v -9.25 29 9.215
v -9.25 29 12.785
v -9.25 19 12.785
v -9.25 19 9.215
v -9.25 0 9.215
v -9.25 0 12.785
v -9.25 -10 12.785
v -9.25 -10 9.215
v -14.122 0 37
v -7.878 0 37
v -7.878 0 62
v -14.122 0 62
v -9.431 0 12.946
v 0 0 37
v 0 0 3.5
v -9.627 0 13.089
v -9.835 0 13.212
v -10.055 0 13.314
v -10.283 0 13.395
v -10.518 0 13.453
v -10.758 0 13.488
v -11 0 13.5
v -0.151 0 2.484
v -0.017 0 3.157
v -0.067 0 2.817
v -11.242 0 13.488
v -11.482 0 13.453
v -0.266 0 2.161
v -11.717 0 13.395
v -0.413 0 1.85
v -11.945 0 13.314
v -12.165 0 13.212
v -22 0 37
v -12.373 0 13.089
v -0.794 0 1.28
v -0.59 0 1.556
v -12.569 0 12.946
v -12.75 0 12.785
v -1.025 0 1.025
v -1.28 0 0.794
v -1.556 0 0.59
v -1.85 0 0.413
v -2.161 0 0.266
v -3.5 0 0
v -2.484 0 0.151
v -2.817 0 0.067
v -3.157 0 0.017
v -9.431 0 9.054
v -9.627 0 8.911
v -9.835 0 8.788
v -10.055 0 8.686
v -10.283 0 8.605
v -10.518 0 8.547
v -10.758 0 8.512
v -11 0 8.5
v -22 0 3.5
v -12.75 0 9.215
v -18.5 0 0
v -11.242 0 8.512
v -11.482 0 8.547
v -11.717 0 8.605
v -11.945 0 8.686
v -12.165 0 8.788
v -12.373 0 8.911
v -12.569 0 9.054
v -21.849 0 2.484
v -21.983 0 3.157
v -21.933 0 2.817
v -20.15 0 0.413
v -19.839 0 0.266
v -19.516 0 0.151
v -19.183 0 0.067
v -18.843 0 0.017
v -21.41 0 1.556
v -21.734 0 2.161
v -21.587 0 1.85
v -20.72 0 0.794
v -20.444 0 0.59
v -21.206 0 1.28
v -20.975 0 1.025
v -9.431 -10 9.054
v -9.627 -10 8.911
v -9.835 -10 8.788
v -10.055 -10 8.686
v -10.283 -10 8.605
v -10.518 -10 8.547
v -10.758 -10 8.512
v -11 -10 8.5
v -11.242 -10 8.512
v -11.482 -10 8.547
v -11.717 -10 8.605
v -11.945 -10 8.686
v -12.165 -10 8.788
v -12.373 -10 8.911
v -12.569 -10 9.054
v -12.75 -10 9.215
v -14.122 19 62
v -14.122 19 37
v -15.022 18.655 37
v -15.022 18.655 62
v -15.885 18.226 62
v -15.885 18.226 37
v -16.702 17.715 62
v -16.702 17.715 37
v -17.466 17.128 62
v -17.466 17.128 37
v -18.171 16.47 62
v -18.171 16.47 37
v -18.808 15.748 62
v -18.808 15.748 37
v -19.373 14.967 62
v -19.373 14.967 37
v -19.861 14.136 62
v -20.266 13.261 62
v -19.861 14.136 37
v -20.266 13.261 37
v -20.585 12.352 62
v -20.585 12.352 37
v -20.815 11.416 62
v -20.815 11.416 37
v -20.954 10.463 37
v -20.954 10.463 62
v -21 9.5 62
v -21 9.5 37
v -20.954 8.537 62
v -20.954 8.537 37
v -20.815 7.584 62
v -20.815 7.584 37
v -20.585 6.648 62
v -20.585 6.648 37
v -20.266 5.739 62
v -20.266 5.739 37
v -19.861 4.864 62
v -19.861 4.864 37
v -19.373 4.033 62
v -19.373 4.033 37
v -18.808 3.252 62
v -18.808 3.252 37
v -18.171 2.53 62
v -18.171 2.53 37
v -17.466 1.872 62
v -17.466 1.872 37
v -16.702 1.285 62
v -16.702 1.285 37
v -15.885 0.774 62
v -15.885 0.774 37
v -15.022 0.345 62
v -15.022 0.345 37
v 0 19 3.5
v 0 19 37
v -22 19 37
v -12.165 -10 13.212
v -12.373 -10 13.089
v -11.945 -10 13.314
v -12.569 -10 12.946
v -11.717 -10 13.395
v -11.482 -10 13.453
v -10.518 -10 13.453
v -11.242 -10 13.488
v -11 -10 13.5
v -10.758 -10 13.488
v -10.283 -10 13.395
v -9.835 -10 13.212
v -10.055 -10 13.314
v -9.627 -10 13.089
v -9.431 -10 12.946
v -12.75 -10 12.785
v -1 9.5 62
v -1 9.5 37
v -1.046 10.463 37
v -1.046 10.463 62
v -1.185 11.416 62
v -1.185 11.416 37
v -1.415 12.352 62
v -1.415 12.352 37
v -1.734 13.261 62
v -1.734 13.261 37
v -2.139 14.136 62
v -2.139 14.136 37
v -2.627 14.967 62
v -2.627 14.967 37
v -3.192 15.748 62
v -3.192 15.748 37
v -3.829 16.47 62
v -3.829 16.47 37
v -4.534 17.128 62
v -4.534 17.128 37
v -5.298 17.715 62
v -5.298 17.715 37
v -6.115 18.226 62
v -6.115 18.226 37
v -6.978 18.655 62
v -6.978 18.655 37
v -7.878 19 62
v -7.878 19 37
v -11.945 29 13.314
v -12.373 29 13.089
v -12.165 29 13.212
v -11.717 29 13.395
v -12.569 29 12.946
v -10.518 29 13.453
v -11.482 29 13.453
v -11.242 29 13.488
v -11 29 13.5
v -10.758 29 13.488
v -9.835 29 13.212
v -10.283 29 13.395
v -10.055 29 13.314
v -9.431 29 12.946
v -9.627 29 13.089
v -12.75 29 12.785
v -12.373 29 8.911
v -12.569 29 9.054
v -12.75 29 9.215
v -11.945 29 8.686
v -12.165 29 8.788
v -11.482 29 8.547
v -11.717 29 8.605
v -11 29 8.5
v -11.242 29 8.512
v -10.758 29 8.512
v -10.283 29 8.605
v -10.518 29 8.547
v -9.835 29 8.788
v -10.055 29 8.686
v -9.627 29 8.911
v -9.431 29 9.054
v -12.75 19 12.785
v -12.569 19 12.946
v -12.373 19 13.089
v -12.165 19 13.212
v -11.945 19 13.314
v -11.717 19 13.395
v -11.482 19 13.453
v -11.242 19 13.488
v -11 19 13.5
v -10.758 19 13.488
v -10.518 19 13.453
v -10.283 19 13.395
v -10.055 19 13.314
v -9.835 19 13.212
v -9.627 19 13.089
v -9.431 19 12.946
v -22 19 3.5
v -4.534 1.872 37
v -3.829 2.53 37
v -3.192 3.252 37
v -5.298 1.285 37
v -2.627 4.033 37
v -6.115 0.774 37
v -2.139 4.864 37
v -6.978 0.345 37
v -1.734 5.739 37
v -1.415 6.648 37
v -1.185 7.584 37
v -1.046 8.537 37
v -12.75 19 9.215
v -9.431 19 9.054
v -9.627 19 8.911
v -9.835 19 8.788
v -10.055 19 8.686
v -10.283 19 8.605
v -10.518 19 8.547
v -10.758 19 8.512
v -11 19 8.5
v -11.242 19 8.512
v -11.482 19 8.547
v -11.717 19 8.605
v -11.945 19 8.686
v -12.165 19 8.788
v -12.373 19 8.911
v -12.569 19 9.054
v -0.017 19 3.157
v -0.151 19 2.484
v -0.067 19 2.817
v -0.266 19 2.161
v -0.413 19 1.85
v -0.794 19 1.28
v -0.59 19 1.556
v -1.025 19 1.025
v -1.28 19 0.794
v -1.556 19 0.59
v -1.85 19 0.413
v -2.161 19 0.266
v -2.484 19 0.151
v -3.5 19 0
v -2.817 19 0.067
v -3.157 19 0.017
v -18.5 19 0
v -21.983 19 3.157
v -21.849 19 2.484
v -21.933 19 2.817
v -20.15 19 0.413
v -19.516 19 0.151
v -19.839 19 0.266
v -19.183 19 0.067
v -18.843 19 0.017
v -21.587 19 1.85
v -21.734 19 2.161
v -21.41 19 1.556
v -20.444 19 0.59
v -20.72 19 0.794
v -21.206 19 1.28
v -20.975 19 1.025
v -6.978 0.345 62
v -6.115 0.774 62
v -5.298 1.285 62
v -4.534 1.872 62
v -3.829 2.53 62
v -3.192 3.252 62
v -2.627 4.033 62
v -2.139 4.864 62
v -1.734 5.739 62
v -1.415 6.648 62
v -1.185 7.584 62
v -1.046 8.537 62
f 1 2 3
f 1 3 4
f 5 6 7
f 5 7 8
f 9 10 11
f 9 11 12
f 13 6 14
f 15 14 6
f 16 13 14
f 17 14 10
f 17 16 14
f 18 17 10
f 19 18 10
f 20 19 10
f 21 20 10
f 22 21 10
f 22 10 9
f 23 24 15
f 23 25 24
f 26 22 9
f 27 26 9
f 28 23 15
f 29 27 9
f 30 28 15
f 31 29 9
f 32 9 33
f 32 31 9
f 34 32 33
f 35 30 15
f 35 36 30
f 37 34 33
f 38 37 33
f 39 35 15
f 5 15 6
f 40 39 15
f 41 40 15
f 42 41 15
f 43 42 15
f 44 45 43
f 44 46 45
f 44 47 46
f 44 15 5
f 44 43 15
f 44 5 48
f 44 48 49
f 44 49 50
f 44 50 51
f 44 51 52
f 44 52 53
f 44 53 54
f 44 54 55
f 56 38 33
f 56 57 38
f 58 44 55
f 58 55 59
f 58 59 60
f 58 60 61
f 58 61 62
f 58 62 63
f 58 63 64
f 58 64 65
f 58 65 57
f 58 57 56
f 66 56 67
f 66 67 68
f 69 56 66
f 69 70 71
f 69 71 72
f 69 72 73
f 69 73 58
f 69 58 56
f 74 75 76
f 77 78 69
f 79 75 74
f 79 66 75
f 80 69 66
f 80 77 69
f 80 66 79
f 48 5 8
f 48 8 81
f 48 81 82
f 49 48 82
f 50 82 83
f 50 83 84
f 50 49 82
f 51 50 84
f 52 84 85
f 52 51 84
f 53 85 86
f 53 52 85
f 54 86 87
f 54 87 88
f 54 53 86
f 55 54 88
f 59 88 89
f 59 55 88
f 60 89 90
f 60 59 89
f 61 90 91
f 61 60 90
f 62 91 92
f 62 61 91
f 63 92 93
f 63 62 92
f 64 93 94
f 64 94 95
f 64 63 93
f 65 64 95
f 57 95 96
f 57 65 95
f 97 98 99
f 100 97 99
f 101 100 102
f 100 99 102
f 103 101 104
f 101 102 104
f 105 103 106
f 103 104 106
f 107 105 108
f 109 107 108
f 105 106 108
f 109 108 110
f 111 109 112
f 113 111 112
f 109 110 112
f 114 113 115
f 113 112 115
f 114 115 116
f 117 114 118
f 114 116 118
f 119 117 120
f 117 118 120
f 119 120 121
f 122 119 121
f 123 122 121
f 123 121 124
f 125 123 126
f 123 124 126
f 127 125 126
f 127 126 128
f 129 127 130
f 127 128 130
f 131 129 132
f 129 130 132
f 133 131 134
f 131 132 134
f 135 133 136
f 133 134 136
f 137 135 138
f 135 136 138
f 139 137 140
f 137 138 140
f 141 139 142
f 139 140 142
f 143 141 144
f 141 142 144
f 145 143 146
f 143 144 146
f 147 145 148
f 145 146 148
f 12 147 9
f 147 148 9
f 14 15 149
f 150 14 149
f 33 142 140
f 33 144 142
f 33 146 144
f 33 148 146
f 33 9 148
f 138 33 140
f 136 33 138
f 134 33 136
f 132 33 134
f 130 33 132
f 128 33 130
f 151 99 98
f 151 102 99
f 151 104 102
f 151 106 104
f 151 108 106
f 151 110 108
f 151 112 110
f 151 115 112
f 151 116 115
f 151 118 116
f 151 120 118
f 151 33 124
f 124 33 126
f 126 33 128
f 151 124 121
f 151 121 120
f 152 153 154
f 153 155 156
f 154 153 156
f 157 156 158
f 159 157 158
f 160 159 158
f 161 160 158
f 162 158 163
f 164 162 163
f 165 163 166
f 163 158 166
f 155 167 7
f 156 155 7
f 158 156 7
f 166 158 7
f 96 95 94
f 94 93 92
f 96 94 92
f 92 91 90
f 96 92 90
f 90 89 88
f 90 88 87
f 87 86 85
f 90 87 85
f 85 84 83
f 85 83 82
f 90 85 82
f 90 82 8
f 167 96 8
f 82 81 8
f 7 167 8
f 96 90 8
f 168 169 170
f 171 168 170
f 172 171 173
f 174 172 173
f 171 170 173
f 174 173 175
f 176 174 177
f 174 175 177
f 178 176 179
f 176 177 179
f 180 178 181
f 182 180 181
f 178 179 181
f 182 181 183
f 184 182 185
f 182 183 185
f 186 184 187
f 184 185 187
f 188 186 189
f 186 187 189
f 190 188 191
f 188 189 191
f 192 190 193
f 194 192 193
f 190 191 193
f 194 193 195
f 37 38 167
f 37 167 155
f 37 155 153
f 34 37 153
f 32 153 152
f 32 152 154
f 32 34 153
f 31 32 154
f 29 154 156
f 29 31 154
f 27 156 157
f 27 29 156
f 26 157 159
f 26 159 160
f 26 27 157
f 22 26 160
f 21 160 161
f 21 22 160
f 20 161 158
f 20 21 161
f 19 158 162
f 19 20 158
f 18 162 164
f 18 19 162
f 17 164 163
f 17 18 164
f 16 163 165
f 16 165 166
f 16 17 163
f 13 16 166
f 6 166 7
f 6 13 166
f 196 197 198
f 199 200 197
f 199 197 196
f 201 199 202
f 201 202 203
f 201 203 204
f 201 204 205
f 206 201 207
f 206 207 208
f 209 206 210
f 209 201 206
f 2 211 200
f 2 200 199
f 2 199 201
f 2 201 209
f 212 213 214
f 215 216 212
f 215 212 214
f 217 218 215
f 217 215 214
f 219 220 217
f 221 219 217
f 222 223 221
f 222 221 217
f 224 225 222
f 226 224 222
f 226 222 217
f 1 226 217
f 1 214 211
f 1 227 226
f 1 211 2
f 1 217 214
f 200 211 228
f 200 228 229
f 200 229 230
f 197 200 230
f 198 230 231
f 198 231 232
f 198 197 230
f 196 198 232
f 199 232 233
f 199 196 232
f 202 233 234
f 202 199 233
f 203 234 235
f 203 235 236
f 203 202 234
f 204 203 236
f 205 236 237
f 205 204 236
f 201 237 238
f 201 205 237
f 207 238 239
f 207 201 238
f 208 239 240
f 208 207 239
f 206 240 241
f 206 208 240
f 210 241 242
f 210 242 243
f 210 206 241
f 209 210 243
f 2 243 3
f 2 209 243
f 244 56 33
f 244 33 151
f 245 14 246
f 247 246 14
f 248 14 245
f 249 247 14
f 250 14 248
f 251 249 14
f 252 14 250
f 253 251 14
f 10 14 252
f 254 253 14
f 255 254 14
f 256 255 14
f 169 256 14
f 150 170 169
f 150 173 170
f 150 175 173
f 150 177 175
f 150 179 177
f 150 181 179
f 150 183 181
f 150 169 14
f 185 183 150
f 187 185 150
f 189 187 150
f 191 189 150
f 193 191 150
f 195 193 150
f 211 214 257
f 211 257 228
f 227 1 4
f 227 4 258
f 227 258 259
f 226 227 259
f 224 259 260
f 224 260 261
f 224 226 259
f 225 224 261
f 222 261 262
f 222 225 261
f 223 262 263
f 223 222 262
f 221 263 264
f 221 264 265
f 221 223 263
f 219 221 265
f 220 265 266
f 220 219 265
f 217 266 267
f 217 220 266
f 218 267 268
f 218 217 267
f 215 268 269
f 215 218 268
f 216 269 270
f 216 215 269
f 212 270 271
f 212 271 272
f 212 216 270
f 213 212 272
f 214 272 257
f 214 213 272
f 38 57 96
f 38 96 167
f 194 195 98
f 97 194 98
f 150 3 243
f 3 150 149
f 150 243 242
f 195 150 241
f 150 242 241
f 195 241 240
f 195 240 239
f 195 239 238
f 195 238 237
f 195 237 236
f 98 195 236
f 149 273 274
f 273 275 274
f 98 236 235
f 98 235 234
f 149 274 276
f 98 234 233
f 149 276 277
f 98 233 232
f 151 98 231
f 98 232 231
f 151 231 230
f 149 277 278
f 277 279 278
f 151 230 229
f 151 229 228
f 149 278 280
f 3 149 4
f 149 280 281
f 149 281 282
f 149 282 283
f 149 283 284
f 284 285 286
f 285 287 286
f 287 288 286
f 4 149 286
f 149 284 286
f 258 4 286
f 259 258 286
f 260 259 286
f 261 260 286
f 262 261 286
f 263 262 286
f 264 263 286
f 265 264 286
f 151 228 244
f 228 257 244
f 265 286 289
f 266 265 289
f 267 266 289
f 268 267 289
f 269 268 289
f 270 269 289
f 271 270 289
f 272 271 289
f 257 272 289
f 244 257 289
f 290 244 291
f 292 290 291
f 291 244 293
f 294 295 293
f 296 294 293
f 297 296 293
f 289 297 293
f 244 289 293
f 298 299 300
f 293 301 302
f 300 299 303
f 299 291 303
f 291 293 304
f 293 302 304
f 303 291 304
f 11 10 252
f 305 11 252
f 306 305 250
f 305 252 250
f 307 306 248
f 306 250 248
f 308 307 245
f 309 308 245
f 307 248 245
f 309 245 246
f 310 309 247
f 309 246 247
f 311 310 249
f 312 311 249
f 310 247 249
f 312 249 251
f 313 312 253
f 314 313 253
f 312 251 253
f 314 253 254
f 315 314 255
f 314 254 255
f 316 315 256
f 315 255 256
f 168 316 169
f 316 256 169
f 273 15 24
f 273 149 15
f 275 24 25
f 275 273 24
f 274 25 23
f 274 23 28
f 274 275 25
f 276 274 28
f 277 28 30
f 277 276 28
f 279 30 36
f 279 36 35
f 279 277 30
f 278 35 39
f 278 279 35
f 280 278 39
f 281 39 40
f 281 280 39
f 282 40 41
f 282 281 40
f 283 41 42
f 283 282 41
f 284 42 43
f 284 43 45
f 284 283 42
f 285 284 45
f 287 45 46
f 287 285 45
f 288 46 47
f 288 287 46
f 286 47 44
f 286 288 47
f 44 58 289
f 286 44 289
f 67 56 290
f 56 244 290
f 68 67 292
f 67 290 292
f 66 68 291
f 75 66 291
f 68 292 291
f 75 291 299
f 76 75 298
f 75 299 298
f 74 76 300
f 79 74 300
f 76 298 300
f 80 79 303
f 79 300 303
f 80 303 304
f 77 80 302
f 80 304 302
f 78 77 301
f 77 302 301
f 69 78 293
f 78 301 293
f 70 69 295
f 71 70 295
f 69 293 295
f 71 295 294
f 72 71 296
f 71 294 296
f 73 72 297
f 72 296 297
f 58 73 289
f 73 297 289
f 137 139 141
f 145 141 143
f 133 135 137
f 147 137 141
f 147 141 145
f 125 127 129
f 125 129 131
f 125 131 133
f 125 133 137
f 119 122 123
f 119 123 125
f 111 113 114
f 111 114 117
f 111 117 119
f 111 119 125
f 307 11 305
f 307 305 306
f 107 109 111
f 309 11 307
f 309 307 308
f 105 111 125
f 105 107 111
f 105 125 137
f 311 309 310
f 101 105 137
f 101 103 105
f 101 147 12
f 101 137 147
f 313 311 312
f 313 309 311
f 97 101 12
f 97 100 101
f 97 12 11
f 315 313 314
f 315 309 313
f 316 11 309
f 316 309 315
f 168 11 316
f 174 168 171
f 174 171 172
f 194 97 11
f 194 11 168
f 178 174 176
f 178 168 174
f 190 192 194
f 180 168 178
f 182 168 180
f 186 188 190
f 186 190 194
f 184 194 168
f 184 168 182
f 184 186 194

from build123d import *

# Parameters (mm, degrees)
SKETCH1_W           = 19
SKETCH1_H           = 22
BOSS_EXTRUDE1_DEPTH = 37
FILLET1_R           = 3.5
BOSS_EXTRUDE2_DEPTH = 19.5
BOSS_EXTRUDE3_DEPTH = 25


with BuildPart() as part:
    # Sketch1 → Boss-Extrude1 (new body)
    with BuildSketch(Plane(origin=(0, 0, 0), x_dir=(0, 1, 0), z_dir=(0, 0, 1))):
        with Locations((9.5, 11)):
            Rectangle(SKETCH1_W, SKETCH1_H)
    extrude(amount=BOSS_EXTRUDE1_DEPTH)

    # Fillet1
    fillet1_edges = [part.edges().sort_by_distance(p)[0] for p in [
        (-22, 9.5, 0),
        (0, 9.5, 0),
    ]]
    fillet(fillet1_edges, radius=FILLET1_R)

    # Sketch2 → Boss-Extrude2 (add, symmetric)
    with BuildSketch(Plane(origin=(0, 9.5, 0), x_dir=(1, 0, 0), z_dir=(0, 1, 0))):
        with BuildLine():
            Line((-12.75, -9.214642893), (-12.75, -11))
            Line((-12.75, -11), (-12.75, -12.785357107))
            ThreePointArc((-12.75, -12.785357107), (-11, -13.5), (-9.25, -12.785357107))
            Line((-9.25, -12.785357107), (-9.25, -11))
            Line((-9.25, -11), (-9.25, -9.214642893))
            ThreePointArc((-9.25, -9.214642893), (-11, -8.5), (-12.75, -9.214642893))
        make_face()
    extrude(amount=BOSS_EXTRUDE2_DEPTH, both=True)

    # Sketch4 → Boss-Extrude3 (add)
    with BuildSketch(Plane.XY.offset(37)):
        with BuildLine():
            Line((-7.877501001, 19), (-11, 19))
            Line((-11, 19), (-11, 0))
            Line((-11, 0), (-7.877501001, 0))
            ThreePointArc((-7.877501001, 0), (-2.899845989, 3.635913967), (-1, 9.5))
            ThreePointArc((-1, 9.5), (-2.899845989, 15.364086033), (-7.877501001, 19))
        make_face()
        with BuildLine():
            Line((-11, 0), (-11, 19))
            Line((-11, 19), (-14.122498999, 19))
            ThreePointArc((-14.122498999, 19), (-21, 9.5), (-14.122498999, 0))
            Line((-14.122498999, 0), (-11, 0))
        make_face()
    extrude(amount=BOSS_EXTRUDE3_DEPTH)


solid = part.part
